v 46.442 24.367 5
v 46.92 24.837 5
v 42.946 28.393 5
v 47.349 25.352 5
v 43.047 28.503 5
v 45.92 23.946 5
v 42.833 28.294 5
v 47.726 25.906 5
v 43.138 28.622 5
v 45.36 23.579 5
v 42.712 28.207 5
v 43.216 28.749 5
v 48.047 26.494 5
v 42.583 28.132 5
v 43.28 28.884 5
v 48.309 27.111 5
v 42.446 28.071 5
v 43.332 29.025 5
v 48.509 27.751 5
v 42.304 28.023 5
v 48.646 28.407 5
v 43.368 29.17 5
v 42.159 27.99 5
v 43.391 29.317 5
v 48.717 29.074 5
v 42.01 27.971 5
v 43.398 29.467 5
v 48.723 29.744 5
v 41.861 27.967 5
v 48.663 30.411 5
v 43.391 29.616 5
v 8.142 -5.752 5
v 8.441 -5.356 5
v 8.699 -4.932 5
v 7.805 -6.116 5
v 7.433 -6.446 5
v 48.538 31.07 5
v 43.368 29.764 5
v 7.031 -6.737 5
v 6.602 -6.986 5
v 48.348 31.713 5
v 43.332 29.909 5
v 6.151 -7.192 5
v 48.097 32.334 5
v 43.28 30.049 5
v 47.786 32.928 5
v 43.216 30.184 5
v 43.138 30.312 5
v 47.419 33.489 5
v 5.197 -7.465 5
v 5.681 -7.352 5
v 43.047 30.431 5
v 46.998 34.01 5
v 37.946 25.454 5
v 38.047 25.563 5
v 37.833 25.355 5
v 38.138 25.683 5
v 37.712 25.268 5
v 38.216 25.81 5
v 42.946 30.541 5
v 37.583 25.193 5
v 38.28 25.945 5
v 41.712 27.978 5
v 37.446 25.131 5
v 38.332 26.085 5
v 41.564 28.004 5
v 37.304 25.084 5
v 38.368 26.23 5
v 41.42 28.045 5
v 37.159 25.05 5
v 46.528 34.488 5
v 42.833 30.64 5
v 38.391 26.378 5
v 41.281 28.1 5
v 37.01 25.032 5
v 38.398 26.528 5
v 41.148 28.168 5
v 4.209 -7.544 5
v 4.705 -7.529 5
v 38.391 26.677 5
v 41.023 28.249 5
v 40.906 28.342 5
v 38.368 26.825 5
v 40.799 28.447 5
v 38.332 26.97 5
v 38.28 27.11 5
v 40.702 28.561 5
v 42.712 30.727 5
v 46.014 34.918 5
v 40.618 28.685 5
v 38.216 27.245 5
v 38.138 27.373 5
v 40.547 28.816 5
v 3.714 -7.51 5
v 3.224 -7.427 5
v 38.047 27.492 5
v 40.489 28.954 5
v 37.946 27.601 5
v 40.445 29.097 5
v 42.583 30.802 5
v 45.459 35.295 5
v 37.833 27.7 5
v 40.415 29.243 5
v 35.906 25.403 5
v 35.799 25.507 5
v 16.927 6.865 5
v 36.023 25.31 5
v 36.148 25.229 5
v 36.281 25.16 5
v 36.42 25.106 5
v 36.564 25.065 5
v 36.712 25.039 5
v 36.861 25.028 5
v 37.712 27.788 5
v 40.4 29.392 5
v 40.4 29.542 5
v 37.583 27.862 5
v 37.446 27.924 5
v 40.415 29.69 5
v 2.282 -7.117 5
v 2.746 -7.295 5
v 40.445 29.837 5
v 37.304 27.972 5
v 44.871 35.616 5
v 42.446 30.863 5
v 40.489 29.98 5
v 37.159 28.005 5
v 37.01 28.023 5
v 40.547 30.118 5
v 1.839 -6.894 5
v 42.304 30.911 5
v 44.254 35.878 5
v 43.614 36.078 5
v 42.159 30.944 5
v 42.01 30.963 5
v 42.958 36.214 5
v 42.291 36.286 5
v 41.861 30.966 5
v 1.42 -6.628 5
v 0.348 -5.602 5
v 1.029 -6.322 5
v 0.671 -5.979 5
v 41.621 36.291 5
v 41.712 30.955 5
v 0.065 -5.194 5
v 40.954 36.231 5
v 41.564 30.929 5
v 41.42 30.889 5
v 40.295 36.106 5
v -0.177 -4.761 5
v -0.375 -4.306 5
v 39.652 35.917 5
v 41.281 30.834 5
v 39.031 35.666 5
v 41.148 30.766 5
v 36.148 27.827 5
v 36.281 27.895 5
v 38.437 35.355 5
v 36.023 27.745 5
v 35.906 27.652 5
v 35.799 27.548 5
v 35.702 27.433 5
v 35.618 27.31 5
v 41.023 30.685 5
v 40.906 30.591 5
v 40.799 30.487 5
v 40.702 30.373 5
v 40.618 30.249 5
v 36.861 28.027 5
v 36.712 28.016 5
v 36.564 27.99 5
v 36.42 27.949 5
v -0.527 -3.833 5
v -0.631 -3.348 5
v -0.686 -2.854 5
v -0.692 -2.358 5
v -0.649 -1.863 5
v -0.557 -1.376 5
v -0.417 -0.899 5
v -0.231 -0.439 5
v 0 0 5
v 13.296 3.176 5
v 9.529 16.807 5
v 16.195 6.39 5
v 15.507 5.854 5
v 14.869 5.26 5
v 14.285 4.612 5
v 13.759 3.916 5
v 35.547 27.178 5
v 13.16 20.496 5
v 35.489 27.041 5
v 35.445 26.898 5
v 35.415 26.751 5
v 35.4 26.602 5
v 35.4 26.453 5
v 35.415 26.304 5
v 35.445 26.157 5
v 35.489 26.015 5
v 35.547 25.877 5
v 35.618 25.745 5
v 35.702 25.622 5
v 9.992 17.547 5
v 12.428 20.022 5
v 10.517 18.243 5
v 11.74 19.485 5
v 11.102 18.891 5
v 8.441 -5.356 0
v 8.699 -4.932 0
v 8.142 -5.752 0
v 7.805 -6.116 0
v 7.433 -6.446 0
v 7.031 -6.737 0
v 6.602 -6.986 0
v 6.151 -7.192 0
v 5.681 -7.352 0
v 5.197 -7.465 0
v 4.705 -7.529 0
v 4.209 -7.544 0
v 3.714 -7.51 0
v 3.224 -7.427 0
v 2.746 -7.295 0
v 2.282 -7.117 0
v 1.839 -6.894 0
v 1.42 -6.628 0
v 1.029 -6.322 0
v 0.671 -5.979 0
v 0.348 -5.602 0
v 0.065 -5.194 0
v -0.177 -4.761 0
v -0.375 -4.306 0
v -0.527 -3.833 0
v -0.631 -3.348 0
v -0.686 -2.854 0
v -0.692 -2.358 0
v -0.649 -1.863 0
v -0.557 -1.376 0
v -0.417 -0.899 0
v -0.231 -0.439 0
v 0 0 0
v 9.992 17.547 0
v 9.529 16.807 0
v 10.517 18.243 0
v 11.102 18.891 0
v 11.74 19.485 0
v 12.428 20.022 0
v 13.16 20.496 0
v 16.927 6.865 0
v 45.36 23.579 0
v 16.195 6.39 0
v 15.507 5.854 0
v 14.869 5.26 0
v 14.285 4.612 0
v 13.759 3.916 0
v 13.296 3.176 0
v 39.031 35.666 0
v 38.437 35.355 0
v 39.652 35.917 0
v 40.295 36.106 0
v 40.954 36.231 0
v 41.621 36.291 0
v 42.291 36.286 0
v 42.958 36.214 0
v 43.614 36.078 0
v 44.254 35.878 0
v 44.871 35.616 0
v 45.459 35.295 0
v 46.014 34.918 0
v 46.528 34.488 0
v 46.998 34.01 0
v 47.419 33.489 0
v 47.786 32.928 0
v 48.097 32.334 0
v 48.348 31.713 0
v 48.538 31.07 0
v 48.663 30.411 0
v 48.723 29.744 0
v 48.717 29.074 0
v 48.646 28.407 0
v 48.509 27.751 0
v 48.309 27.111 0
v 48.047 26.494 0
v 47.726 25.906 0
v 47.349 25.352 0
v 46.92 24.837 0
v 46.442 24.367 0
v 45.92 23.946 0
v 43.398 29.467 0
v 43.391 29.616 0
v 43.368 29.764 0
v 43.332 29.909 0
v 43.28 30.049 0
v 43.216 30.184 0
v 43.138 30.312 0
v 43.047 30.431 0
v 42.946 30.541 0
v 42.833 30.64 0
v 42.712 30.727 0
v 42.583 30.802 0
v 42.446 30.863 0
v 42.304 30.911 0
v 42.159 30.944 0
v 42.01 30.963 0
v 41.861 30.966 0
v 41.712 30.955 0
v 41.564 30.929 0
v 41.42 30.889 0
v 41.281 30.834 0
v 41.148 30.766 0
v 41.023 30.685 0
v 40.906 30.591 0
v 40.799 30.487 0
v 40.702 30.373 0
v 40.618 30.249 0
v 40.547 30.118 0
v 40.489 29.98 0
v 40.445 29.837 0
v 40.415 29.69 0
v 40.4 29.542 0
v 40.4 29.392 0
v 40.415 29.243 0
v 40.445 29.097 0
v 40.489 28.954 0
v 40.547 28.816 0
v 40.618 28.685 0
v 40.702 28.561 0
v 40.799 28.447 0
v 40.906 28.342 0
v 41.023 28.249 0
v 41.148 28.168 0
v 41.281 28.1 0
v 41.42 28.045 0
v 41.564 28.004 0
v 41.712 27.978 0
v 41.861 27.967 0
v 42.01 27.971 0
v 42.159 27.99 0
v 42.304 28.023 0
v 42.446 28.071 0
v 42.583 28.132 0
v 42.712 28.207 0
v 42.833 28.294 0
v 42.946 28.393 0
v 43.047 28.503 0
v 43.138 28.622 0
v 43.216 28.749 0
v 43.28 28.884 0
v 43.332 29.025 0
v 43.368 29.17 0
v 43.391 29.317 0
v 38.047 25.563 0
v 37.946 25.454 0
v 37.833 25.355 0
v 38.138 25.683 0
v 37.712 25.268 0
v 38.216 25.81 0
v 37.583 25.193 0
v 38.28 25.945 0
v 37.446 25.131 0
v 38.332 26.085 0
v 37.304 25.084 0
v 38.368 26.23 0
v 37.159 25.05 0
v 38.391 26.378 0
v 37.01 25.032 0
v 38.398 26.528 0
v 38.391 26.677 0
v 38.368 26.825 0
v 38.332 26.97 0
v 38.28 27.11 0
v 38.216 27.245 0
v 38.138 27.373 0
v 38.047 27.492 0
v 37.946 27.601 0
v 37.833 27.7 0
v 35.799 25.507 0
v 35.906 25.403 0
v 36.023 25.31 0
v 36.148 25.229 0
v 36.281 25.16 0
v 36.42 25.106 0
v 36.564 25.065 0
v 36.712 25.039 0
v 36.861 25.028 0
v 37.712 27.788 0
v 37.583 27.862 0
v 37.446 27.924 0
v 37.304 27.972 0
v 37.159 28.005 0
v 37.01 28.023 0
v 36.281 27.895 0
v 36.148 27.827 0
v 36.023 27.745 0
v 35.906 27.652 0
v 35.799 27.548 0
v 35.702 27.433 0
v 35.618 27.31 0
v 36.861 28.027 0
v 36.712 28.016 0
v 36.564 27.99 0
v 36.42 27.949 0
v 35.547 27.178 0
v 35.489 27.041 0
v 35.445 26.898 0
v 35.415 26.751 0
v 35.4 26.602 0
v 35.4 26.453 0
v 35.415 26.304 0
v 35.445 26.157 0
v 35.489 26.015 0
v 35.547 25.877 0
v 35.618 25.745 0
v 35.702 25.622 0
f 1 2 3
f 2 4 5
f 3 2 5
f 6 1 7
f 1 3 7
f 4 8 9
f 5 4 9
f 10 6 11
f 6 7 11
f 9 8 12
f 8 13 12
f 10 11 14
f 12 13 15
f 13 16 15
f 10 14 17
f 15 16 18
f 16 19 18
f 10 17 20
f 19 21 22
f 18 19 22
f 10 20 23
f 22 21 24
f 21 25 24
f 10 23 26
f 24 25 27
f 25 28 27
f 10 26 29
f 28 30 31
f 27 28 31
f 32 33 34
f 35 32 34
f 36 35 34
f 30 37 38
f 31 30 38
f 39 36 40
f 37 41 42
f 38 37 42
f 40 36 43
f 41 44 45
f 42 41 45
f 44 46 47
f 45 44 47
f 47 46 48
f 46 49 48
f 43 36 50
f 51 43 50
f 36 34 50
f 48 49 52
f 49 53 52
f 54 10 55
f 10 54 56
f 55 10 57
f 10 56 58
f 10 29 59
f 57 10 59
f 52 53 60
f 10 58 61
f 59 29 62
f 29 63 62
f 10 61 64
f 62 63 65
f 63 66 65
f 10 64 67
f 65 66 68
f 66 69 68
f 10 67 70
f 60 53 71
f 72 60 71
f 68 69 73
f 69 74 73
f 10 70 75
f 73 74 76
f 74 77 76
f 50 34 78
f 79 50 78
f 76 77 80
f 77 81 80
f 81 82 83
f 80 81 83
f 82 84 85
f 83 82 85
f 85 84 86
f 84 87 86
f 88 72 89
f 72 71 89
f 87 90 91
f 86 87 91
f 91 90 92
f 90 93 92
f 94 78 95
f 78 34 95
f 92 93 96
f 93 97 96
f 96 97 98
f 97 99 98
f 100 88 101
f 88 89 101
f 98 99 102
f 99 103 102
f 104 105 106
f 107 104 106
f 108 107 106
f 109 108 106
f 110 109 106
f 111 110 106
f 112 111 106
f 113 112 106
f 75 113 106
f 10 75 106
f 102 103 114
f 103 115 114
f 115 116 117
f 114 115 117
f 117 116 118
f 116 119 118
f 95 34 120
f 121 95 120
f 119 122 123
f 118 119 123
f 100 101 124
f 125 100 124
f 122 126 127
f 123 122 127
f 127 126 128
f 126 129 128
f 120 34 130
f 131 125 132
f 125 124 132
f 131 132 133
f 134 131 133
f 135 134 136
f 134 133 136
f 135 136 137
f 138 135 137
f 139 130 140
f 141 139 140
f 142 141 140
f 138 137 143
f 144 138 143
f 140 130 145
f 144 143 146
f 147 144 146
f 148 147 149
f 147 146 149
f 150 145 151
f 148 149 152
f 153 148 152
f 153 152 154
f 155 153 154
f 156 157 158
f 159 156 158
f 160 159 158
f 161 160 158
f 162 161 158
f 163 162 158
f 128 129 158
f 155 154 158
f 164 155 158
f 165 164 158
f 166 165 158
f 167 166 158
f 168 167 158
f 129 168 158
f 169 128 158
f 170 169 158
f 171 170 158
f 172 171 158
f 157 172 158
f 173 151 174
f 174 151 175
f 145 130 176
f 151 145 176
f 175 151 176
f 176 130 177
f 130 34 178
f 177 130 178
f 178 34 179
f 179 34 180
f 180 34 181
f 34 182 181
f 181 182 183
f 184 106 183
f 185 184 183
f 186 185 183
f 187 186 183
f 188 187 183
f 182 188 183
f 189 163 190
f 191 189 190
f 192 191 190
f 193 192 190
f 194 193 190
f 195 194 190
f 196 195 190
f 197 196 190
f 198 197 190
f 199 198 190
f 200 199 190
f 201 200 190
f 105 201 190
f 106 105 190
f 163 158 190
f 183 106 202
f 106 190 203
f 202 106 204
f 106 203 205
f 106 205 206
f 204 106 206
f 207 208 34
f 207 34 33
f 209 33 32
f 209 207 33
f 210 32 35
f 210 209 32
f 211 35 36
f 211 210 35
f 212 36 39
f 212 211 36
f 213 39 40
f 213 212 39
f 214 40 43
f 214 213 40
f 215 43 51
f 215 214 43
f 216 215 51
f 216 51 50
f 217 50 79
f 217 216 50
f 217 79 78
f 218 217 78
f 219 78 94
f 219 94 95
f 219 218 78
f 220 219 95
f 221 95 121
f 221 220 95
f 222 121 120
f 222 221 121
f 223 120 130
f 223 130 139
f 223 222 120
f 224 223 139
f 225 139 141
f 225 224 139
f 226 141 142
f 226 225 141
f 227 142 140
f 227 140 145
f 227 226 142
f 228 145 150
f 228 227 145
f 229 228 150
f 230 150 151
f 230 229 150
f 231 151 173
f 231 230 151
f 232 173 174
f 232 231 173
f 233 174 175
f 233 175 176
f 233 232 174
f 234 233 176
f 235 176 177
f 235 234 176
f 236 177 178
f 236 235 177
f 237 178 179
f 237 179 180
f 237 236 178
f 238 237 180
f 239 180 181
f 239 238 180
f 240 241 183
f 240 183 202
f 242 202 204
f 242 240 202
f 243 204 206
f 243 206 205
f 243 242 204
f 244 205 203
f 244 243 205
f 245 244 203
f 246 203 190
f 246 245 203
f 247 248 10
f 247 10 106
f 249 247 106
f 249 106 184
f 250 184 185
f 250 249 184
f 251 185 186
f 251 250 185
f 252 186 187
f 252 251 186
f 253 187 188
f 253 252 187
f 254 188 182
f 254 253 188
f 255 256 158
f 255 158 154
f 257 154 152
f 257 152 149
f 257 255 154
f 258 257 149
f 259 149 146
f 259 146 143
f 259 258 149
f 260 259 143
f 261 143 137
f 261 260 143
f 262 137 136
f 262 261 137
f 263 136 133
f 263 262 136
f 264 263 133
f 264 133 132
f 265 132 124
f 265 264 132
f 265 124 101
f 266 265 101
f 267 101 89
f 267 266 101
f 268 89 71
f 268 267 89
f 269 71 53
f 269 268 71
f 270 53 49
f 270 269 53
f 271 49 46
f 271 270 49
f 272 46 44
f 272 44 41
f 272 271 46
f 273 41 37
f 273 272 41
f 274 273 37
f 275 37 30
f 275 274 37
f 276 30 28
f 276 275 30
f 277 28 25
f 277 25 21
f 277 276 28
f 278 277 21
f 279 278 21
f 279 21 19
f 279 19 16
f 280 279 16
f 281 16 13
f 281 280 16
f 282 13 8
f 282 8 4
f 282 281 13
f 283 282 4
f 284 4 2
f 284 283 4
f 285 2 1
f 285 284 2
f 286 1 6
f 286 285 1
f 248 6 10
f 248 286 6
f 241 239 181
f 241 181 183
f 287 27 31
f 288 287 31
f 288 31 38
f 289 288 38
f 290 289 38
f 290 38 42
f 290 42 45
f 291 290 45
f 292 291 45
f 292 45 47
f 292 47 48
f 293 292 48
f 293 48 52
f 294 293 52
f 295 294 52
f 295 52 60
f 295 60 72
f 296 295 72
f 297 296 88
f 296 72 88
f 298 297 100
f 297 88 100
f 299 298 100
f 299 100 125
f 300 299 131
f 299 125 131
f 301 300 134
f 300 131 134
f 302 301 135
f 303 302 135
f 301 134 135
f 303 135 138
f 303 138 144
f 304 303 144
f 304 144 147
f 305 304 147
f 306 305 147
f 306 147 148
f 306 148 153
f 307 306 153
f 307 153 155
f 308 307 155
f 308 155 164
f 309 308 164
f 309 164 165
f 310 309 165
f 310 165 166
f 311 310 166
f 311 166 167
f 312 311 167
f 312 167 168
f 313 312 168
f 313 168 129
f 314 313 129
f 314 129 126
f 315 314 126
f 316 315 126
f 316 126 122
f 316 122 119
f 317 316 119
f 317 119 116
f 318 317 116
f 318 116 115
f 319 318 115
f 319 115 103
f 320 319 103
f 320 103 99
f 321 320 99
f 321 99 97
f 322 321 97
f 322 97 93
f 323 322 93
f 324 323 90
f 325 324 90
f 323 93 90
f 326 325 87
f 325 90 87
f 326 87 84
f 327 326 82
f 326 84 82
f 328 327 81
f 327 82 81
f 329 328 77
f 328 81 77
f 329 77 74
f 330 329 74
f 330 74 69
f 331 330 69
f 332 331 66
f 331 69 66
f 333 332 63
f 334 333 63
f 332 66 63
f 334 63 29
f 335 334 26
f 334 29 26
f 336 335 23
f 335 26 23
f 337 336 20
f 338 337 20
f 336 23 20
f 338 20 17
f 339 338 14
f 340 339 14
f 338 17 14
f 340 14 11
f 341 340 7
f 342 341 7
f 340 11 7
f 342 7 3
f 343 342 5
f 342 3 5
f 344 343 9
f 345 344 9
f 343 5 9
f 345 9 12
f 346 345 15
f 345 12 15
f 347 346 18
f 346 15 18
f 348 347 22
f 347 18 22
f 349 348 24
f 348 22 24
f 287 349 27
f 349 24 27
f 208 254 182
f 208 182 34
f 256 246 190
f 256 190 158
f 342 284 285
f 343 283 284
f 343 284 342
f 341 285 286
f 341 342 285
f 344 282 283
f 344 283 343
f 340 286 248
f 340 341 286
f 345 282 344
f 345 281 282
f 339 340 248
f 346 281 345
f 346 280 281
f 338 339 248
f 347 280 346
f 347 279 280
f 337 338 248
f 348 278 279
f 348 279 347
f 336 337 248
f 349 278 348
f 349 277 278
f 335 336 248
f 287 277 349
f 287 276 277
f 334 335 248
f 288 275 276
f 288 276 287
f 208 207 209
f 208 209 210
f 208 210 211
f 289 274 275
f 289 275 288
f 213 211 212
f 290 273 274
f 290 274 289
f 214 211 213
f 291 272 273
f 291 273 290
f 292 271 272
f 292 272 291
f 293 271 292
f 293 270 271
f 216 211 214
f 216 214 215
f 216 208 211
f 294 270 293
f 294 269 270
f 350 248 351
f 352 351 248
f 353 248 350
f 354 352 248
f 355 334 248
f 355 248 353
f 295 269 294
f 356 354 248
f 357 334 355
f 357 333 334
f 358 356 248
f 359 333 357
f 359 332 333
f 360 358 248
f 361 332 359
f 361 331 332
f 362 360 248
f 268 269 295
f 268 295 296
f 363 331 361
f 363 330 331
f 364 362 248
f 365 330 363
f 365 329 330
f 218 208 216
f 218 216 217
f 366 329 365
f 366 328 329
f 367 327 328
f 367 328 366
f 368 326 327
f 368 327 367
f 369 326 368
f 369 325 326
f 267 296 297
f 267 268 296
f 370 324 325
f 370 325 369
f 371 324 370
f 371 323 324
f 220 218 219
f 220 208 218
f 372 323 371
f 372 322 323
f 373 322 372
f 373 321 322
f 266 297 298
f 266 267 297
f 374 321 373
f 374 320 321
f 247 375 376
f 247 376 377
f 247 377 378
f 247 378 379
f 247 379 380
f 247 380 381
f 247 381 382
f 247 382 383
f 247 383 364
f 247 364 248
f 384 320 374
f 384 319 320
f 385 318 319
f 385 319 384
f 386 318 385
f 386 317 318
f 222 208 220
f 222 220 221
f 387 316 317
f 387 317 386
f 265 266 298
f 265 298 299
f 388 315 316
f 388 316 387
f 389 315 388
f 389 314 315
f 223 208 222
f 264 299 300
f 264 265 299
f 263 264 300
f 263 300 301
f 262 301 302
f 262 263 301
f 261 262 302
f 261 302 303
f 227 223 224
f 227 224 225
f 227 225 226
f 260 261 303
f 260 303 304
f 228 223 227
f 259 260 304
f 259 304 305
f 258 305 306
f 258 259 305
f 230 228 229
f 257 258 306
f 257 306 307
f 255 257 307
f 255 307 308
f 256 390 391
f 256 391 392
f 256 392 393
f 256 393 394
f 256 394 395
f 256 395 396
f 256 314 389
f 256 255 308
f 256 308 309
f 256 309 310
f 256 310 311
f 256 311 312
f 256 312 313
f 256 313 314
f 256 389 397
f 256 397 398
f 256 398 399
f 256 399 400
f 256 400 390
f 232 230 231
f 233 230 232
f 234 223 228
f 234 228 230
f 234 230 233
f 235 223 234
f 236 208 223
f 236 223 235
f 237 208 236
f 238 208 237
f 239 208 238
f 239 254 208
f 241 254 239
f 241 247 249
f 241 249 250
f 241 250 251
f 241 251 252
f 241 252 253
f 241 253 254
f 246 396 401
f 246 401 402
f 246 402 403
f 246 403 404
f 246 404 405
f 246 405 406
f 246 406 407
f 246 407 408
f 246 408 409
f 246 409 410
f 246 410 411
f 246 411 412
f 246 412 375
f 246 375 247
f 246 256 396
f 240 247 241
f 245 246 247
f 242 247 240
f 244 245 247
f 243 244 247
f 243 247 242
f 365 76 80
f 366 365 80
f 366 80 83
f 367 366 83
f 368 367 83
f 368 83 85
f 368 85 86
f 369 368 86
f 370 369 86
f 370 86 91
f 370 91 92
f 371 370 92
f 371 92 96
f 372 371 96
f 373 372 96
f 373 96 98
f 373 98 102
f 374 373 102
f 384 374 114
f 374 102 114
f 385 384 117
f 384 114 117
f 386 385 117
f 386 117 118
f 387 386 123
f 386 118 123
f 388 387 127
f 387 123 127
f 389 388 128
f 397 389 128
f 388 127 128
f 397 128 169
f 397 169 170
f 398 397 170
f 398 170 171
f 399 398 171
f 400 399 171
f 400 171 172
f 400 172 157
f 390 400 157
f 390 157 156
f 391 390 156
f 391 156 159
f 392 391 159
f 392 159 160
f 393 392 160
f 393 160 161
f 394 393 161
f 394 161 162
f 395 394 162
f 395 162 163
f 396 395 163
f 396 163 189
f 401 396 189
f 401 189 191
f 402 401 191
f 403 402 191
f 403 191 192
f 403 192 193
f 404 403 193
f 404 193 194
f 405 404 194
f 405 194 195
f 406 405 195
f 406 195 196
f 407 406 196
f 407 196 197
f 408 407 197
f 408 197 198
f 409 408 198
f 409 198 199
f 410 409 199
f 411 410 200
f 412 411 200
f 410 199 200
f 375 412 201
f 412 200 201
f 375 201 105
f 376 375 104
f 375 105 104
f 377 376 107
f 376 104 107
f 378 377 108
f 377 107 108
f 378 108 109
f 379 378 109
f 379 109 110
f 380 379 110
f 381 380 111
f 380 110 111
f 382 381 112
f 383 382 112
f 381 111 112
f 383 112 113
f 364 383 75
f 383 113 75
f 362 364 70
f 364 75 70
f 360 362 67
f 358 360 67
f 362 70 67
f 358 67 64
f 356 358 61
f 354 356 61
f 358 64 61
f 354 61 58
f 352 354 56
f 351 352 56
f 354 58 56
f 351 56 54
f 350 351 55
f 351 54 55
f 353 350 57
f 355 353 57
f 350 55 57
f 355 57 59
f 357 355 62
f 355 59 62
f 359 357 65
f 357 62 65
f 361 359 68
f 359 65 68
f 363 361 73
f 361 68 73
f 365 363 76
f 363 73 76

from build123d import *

# Parameters (mm, degrees)
BOSS_EXTRUDE1_DEPTH = 5
SKETCH4_R           = 1.5
CUT_EXTRUDE1_DEPTH  = 7


with BuildPart() as part:
    # Sketch3 → Boss-Extrude1 (new body)
    with BuildSketch(Plane.XY):
        with BuildLine():
            Line((0, 0), (9.528804476, 16.807257883))
            ThreePointArc((9.528804476, 16.807257883), (11.101707988, 18.890718774), (13.160255471, 20.496090072))
            Line((13.160255471, 20.496090072), (38.436867059, 35.354929207))
            ThreePointArc((38.436867059, 35.354929207), (47.786303491, 32.928139434), (45.359513719, 23.578703003))
            Line((45.359513719, 23.578703003), (16.927471829, 6.864946286))
            ThreePointArc((16.927471829, 6.864946286), (14.868924346, 5.259574989), (13.296020834, 3.176114098))
            Line((13.296020834, 3.176114098), (8.699180072, -4.931963714))
            ThreePointArc((8.699180072, -4.931963714), (1.838948591, -6.894344126), (0, 0))
        make_face()
    extrude(amount=BOSS_EXTRUDE1_DEPTH)

    # Sketch4 → Cut-Extrude1 (cut)
    with BuildSketch(Plane.XY.offset(5)):
        with Locations((41.898190389, 29.466816105)):
            Circle(SKETCH4_R)
        with Locations((36.898190389, 26.527569465)):
            Circle(SKETCH4_R)
    extrude(amount=-CUT_EXTRUDE1_DEPTH, mode=Mode.SUBTRACT)


solid = part.part
